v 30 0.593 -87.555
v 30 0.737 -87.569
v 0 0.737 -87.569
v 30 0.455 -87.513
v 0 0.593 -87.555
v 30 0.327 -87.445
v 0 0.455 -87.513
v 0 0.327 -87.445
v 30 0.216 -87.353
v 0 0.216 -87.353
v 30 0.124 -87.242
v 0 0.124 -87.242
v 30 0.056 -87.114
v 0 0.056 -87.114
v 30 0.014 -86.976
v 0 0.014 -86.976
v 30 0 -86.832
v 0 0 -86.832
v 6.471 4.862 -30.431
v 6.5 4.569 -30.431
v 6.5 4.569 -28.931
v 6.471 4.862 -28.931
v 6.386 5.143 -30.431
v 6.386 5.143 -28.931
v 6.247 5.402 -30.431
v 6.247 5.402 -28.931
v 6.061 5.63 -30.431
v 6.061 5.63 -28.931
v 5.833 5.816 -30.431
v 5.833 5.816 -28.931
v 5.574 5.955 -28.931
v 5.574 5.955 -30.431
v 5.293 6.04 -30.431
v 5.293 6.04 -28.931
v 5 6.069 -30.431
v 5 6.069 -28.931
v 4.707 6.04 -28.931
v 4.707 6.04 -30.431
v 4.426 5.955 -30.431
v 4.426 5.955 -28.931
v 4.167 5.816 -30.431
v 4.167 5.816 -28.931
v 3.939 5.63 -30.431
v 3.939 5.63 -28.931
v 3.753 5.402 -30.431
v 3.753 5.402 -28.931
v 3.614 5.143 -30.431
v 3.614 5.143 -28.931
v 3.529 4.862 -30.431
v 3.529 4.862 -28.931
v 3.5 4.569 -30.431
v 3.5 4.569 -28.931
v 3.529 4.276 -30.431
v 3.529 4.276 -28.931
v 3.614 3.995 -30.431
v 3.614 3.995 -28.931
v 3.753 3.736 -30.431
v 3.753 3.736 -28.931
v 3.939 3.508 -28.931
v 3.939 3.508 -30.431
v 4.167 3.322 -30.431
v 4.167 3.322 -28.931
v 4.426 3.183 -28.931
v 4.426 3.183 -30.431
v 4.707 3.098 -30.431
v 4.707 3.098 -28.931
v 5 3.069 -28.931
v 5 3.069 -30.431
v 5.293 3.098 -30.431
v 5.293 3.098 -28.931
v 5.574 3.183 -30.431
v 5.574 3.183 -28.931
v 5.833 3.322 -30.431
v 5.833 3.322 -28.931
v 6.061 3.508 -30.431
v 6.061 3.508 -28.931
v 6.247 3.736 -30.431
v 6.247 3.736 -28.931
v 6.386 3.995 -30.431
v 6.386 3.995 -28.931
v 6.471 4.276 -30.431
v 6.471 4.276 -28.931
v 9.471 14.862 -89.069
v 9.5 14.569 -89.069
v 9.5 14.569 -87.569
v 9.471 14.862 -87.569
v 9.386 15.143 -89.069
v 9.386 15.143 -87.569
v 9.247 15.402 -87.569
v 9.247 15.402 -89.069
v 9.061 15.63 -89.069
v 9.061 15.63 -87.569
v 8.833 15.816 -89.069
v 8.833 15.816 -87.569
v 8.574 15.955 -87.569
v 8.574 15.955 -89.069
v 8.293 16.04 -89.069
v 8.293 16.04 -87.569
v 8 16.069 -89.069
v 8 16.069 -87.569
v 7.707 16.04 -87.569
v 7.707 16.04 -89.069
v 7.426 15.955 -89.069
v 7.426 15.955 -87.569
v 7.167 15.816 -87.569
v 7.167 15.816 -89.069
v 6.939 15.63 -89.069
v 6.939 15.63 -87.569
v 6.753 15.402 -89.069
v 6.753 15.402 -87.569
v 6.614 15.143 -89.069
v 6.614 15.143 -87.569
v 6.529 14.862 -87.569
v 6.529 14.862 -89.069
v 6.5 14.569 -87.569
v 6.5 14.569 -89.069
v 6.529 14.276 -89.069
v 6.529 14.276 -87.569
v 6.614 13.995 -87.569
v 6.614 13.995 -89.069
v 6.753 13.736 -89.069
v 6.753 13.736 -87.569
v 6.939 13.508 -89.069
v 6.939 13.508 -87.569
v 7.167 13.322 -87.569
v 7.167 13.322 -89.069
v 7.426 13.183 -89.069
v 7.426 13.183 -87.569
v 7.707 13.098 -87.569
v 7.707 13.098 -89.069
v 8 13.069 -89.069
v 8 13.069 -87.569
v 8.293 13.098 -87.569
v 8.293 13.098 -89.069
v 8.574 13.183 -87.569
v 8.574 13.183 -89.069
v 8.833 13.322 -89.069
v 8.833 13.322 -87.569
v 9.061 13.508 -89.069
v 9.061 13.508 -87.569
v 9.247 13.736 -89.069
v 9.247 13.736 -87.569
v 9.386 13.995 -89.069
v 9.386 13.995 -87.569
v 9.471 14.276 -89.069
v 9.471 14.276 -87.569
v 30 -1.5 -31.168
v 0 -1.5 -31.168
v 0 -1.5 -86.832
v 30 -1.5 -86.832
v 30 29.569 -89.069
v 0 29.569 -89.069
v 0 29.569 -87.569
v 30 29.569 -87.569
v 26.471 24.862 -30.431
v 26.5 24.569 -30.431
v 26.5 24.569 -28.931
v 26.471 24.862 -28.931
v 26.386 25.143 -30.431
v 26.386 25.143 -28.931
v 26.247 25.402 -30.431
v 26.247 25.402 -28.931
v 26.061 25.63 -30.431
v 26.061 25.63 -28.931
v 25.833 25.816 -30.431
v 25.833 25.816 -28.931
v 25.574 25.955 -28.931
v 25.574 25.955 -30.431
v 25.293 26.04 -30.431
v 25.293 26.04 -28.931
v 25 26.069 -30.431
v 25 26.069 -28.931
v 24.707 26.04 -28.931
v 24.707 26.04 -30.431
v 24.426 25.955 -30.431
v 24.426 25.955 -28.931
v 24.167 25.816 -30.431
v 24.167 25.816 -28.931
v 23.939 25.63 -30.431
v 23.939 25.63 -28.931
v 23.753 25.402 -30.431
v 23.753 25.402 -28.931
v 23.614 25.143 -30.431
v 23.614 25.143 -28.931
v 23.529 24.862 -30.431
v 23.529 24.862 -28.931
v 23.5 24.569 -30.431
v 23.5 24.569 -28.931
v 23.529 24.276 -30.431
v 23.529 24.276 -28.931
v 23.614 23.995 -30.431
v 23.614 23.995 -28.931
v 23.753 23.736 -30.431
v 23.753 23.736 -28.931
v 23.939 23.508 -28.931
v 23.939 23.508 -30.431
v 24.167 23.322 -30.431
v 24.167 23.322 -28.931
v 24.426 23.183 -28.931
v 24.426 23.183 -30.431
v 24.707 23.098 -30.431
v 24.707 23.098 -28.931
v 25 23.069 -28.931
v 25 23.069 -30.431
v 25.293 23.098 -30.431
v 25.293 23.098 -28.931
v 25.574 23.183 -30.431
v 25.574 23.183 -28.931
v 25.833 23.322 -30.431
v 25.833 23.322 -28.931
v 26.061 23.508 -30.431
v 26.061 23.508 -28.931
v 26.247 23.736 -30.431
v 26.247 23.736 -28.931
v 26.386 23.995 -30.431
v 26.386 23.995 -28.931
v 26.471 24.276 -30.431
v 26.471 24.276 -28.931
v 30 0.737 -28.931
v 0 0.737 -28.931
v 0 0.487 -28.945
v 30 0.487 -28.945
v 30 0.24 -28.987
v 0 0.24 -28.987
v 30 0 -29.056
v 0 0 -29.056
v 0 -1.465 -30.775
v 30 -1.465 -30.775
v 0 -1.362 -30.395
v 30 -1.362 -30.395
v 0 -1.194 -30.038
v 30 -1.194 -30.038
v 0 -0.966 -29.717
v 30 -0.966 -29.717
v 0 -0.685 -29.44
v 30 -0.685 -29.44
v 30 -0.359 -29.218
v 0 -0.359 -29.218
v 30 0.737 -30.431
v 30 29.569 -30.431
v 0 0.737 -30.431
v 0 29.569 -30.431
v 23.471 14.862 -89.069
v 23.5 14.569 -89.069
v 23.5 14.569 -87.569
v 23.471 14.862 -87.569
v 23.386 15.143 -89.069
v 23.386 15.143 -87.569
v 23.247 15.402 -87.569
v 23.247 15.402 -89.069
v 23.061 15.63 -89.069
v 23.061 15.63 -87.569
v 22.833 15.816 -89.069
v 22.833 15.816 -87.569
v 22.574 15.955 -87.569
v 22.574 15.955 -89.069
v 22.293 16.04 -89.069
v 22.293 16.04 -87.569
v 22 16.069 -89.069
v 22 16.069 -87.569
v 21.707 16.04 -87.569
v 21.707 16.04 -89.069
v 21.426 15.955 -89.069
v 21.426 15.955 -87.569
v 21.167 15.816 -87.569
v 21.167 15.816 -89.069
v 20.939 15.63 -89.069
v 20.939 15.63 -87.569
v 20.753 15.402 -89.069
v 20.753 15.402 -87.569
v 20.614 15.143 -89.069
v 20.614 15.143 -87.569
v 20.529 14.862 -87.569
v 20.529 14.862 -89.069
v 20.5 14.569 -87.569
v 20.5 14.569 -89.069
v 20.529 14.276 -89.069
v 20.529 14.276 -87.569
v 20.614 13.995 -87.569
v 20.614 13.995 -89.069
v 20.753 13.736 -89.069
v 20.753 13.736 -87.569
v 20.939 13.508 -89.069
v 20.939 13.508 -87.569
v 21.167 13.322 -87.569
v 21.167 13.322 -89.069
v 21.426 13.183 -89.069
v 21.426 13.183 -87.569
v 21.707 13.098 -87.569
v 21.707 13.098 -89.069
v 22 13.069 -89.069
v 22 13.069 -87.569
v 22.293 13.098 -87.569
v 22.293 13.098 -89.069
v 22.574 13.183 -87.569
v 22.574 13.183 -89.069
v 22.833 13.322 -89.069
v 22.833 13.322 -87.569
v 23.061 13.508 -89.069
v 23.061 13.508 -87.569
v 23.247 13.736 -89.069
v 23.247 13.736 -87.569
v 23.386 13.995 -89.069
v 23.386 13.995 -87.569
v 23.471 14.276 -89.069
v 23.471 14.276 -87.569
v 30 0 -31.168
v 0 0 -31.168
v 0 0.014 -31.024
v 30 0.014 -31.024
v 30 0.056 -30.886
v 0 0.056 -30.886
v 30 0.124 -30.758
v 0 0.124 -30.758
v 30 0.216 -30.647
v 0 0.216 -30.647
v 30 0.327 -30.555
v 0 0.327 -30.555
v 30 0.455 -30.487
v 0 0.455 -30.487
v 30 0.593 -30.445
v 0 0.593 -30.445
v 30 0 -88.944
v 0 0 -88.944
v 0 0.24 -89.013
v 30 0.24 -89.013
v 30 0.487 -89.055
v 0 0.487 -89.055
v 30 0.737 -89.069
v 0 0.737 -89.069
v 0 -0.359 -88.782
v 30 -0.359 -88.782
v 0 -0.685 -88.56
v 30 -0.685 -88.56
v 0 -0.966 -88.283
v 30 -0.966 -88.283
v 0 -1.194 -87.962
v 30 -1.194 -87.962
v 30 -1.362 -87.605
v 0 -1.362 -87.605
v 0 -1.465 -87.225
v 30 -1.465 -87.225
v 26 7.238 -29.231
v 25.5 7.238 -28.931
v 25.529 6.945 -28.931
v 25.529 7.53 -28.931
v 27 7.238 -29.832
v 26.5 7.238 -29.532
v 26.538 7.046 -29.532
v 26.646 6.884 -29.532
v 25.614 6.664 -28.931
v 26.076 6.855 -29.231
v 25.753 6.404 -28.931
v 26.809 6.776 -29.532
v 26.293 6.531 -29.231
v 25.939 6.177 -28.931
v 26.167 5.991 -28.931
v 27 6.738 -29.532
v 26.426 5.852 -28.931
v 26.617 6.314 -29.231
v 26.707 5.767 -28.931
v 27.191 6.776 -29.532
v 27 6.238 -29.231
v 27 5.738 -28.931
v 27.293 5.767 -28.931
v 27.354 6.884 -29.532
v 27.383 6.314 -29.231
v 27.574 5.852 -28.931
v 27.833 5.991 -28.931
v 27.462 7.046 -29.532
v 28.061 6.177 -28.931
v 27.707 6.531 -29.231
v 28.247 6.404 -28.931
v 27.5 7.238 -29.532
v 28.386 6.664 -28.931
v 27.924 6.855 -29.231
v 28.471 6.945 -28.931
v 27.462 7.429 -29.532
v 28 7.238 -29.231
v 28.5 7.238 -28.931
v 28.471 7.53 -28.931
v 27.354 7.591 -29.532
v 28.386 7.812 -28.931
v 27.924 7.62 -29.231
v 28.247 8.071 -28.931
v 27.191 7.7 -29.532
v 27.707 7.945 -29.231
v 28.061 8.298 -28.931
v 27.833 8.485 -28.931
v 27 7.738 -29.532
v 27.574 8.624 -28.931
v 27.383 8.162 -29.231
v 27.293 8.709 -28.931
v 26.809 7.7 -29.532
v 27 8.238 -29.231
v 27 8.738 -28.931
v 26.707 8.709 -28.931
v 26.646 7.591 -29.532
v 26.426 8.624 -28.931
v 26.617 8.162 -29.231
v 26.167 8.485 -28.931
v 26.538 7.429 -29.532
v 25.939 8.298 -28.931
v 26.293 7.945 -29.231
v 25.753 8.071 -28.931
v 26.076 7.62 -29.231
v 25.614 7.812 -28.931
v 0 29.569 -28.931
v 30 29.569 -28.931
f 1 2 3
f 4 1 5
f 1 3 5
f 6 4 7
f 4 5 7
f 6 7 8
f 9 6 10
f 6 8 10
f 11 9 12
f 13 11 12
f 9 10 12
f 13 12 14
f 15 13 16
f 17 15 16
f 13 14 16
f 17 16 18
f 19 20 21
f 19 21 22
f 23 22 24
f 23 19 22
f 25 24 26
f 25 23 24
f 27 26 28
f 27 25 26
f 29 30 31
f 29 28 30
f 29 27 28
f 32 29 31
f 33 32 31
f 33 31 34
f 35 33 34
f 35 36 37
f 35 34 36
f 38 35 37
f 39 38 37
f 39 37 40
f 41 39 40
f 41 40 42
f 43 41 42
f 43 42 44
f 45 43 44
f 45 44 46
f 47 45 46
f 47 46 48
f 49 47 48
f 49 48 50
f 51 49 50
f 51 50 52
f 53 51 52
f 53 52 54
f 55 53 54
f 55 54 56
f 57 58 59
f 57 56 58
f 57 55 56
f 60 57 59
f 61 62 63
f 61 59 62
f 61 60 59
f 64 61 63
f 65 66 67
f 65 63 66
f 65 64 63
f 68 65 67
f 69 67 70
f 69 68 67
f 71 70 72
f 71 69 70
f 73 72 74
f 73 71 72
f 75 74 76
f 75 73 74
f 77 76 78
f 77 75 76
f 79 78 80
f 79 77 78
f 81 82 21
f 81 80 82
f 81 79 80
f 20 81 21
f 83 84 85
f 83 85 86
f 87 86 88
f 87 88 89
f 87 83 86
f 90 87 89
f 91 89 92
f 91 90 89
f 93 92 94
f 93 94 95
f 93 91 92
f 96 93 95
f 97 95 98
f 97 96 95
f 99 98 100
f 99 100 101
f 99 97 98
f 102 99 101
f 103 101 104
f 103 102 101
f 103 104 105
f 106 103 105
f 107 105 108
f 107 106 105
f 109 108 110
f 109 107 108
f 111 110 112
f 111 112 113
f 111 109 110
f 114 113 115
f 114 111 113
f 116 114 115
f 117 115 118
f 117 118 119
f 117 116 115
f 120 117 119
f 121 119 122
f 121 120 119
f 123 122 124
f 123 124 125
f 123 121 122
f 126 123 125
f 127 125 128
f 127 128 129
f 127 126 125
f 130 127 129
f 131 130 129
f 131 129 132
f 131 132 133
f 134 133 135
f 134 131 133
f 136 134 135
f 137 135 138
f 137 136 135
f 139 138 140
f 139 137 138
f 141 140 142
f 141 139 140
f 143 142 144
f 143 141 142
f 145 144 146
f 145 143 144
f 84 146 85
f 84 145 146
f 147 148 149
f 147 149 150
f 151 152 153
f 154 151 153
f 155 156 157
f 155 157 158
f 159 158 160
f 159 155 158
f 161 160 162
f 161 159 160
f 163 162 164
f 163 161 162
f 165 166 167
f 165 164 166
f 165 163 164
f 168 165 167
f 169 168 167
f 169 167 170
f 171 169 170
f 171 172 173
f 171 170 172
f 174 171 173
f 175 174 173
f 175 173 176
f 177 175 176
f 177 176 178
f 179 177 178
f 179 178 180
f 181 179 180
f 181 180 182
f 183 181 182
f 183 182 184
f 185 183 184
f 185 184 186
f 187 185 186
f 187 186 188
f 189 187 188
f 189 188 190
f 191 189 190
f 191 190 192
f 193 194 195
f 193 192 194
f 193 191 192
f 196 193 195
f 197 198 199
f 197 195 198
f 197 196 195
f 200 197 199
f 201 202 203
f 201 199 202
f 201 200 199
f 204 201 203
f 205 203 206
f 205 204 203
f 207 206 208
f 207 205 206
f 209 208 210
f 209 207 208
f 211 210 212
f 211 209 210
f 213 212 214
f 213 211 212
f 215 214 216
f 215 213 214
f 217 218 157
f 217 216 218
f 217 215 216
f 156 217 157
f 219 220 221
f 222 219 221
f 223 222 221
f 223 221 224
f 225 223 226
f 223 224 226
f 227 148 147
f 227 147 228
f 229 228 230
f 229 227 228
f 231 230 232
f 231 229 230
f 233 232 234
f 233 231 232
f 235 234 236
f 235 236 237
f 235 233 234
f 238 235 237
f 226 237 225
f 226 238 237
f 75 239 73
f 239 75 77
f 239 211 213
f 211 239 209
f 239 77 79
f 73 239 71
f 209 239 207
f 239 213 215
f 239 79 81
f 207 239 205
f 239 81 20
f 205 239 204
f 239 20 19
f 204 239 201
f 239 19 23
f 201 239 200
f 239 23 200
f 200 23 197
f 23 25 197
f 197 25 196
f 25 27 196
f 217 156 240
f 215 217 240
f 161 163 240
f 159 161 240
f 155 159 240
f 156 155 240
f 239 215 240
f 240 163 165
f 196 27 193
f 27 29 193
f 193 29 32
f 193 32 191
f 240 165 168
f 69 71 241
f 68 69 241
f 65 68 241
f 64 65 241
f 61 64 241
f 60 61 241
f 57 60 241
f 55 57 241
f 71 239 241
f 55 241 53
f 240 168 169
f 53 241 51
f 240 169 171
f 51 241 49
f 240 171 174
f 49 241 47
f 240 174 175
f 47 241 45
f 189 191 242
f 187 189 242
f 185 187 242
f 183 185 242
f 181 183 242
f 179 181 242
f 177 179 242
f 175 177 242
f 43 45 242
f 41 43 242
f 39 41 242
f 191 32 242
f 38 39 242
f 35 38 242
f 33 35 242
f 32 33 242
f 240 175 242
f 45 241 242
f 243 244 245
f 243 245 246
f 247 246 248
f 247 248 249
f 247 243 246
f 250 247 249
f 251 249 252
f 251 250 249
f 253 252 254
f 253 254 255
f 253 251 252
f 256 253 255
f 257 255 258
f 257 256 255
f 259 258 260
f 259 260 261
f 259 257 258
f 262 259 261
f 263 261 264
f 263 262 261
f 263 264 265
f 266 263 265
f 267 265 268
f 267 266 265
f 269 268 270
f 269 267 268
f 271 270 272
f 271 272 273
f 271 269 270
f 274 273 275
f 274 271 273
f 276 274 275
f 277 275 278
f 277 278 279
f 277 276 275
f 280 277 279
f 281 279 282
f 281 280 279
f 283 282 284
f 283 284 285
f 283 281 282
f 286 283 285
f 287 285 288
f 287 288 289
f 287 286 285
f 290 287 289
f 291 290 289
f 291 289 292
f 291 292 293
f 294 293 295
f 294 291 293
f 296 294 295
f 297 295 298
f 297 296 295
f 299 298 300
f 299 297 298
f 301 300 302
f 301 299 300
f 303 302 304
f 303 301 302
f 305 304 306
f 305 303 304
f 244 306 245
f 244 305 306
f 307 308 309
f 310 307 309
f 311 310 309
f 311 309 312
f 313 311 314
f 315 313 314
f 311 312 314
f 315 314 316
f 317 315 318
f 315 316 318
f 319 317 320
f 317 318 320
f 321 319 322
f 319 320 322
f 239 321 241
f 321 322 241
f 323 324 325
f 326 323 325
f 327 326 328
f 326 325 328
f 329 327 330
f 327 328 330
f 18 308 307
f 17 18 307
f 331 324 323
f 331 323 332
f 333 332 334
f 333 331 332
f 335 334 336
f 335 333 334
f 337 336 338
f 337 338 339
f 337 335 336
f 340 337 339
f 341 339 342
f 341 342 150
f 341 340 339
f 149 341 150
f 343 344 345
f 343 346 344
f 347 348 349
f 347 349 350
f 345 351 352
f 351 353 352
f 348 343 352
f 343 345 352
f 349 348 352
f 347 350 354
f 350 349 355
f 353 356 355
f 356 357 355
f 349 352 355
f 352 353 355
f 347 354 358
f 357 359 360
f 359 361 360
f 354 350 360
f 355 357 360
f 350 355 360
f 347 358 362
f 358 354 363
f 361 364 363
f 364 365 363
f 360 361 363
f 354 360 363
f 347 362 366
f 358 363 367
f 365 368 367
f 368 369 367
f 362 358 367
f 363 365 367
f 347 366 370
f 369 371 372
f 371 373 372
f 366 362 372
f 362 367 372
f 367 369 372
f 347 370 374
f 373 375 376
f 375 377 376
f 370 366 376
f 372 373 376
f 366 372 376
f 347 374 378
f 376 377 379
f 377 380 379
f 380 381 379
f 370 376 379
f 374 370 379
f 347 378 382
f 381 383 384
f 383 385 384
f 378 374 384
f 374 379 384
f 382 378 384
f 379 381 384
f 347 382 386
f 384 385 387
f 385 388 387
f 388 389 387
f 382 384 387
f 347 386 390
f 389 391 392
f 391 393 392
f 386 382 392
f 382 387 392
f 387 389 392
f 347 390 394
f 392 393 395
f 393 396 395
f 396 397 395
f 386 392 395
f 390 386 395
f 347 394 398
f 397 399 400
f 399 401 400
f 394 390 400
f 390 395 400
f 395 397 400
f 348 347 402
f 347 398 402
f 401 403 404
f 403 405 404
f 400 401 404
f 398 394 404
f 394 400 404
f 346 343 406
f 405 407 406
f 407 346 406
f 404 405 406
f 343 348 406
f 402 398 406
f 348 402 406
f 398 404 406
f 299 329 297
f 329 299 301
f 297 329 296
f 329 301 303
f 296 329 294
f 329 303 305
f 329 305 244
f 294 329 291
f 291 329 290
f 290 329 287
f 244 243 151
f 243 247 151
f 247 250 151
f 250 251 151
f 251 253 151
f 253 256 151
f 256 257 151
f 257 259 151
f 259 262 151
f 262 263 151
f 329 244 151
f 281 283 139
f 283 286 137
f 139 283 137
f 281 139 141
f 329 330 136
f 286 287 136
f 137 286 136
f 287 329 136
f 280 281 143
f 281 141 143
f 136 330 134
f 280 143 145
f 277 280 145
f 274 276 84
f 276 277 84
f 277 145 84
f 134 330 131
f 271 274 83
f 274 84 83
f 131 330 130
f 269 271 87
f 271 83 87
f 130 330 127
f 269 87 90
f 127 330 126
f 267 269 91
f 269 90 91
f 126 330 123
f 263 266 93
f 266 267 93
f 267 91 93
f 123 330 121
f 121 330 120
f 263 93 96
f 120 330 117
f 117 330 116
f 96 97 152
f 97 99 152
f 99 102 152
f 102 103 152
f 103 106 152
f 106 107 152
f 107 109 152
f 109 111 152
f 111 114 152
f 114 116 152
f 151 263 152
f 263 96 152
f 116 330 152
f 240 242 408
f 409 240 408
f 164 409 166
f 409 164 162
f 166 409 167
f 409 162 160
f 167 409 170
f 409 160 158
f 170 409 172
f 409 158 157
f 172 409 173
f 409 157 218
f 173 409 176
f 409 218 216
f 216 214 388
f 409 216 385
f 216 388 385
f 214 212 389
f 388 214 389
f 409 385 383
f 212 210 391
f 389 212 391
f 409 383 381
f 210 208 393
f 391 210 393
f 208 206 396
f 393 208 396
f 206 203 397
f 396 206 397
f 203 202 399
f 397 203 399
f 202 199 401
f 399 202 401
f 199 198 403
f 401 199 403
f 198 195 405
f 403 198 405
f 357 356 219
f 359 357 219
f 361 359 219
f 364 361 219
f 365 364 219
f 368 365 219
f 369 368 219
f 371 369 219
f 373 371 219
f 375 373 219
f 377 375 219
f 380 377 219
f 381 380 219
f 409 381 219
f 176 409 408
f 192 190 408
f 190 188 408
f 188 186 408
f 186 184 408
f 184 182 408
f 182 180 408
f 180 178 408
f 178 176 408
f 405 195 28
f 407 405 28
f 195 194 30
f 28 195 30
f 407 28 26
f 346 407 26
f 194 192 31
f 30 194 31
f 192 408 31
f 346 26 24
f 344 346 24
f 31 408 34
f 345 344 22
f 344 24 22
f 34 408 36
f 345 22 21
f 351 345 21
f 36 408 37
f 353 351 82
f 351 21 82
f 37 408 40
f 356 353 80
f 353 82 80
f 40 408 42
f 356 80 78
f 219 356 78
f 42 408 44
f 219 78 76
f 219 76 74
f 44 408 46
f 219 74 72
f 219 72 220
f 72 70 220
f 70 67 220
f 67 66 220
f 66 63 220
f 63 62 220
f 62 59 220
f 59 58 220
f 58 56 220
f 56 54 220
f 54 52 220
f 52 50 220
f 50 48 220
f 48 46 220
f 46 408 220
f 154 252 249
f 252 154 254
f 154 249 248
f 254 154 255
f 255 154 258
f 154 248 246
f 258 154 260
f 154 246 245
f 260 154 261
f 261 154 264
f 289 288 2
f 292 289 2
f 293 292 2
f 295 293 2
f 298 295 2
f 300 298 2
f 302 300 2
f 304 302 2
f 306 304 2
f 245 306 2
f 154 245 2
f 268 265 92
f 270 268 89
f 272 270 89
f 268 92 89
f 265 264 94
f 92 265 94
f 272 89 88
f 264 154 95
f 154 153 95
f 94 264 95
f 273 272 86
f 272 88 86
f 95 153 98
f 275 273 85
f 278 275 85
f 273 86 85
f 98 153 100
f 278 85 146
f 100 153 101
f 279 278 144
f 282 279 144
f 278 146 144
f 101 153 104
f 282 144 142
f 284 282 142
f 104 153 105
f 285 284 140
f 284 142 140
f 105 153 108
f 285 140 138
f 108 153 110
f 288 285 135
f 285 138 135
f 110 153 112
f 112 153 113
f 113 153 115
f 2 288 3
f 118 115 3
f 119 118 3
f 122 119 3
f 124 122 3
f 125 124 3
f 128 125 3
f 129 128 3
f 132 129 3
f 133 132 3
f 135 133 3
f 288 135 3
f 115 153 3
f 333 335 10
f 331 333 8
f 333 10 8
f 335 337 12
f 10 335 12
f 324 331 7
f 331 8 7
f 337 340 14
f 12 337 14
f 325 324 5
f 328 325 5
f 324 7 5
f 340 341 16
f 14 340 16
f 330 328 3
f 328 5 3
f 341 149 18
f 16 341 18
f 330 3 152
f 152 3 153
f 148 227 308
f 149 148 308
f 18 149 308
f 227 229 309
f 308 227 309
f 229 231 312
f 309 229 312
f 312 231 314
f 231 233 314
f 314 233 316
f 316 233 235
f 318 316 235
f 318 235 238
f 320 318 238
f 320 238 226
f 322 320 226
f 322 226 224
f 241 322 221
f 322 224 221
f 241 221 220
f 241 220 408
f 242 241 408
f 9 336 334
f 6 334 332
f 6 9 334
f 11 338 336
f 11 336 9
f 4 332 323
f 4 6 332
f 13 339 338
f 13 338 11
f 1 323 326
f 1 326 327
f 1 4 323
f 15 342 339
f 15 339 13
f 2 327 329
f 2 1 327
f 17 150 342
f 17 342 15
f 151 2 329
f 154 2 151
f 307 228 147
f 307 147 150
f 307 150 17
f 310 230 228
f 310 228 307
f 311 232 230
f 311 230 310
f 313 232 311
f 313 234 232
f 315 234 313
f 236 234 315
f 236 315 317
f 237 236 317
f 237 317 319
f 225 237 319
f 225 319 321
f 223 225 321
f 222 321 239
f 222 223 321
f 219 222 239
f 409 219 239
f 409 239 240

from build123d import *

# Parameters (mm, degrees)
SKETCH1_W                       = 30
SKETCH1_H                       = 118
SKETCH1_R                       = 1.5
BASE_FLANGE1_DEPTH              = 1.5
SKETCHED_BEND1_DEPTH            = 30
SKETCHED_BEND1_2_DEPTH          = 30
SKETCHED_START                  = -89.06902709
SKETCHED_BEND1_3_OUTLINE_R      = 1.5
SKETCHED_BEND1_3_DEPTH          = 1.5
SKETCHED_START_2                = -87.56902709
SKETCHED_BEND1_4_OUTLINE_R      = 1.5
SKETCHED_BEND1_4_DEPTH          = 59.56902709
F_3_0MM_PRESS_DOWEL_HOLE1_D     = 3
F_3_0MM_PRESS_DOWEL_HOLE1_DEPTH = 6
F_3_0MM_PRESS_DOWEL_HOLE1_TIP   = 0.901290929


with BuildPart() as part:
    # Base-Flange1: sheet metal written as solids
    # Sketch1 → Base-Flange1 (new body)
    with BuildSketch(Plane(origin=(0, 0, 0), x_dir=(1, 0, 0), z_dir=(0, 1, 0))):
        with Locations((15, 59)):
            Rectangle(SKETCH1_W, SKETCH1_H)
        with Locations(Location((8, 103, 0), (0, 0, 270))):
            Circle(SKETCH1_R, mode=Mode.SUBTRACT)
        with Locations(Location((22, 103, 0), (0, 0, 270))):
            Circle(SKETCH1_R, mode=Mode.SUBTRACT)
        with Locations(Location((25, 5, 0), (0, 0, 270))):
            Circle(SKETCH1_R, mode=Mode.SUBTRACT)
        with Locations(Location((5, 25, 0), (0, 0, 270))):
            Circle(SKETCH1_R, mode=Mode.SUBTRACT)
    extrude(amount=-BASE_FLANGE1_DEPTH)

    # Sketched Bend1: read off the stored shape, not the designer's step
    # Sketched Bend1 outline → Sketched Bend1 (cut)
    with BuildSketch(Plane.YZ):
        with BuildLine():
            ThreePointArc((0, -88.944250946), (-1.086838938, -88.127591172), (-1.5, -86.83242709))
            Line((-1.5, -86.83242709), (-1.5, -118))
            Line((-1.5, -118), (0, -118))
            Line((0, -118), (0, -88.944250946))
        make_face()
        with BuildLine():
            Line((-1.5, 0), (-1.5, -31.16757291))
            ThreePointArc((-1.5, -31.16757291), (-1.086838938, -29.872408828), (0, -29.055749054))
            Line((0, -29.055749054), (0, 0))
            Line((0, 0), (-1.5, 0))
        make_face()
    extrude(amount=SKETCHED_BEND1_DEPTH, mode=Mode.SUBTRACT)

    # Sketched Bend1 2 outline → Sketched Bend1 2 (add)
    with BuildSketch(Plane.YZ):
        with BuildLine():
            Line((0, -86.83242709), (0, -88.944250946))
            ThreePointArc((0, -88.944250946), (0.363053267, -89.037612433), (0.7366, -89.06902709))
            Line((0.7366, -89.06902709), (29.56902709, -89.06902709))
            Line((29.56902709, -89.06902709), (29.56902709, -87.56902709))
            Line((29.56902709, -87.56902709), (0.7366, -87.56902709))
            ThreePointArc((0.7366, -87.56902709), (0.215745145, -87.353281945), (0, -86.83242709))
        make_face()
        with BuildLine():
            ThreePointArc((0.7366, -28.93097291), (0.363053267, -28.962387567), (0, -29.055749054))
            Line((0, -29.055749054), (0, -31.16757291))
            ThreePointArc((0, -31.16757291), (0.215745145, -30.646718055), (0.7366, -30.43097291))
            Line((0.7366, -30.43097291), (29.56902709, -30.43097291))
            Line((29.56902709, -30.43097291), (29.56902709, -28.93097291))
            Line((29.56902709, -28.93097291), (0.7366, -28.93097291))
        make_face()
    extrude(amount=SKETCHED_BEND1_2_DEPTH)

    # Sketched Bend1 3 outline → Sketched Bend1 3 (cut)
    with BuildSketch(Plane.XY.offset(SKETCHED_START)):
        with Locations((8, 14.56902709)):
            Circle(SKETCHED_BEND1_3_OUTLINE_R)
        with Locations((22, 14.56902709)):
            Circle(SKETCHED_BEND1_3_OUTLINE_R)
    extrude(amount=SKETCHED_BEND1_3_DEPTH, mode=Mode.SUBTRACT)

    # Sketched Bend1 4 outline → Sketched Bend1 4 (cut)
    with BuildSketch(Plane.XY.offset(SKETCHED_START_2)):
        with Locations((5, 4.56902709)):
            Circle(SKETCHED_BEND1_4_OUTLINE_R)
        with Locations((25, 24.56902709)):
            Circle(SKETCHED_BEND1_4_OUTLINE_R)
    extrude(amount=SKETCHED_BEND1_4_DEPTH, mode=Mode.SUBTRACT)

    # Ø3.0mm Press Dowel Hole1
    with Locations(Plane(origin=(257.525513363, 325.031359221, -22.93097291), x_dir=(-1, 0, 0), z_dir=(0, 0, 1))):
        with Locations((220.525513363, 156.531359221), (102.525513363, 181.531359221), (102.525513363, 271.531359221), (89.19270005, 226.531359221), (210.525513363, 317.793651488), (230.525513363, 317.793651488), (252.525513363, 320.462332131), (232.525513363, 300.462332131), (252.525513363, 132.600386311), (232.525513363, 152.600386311), (111.286271896, 136.531359221), (91.286271896, 136.531359221), (41.525513363, 196.432813402), (13.525513363, 196.432813402), (41.525513363, 138.767959221), (13.525513363, 138.767959221), (41.525513363, 256.62990504), (13.525513363, 256.62990504), (41.525513363, 314.294759221), (13.525513363, 314.294759221)):
            Hole(F_3_0MM_PRESS_DOWEL_HOLE1_D / 2, depth=F_3_0MM_PRESS_DOWEL_HOLE1_DEPTH)
            with Locations((0, 0, -(F_3_0MM_PRESS_DOWEL_HOLE1_DEPTH + F_3_0MM_PRESS_DOWEL_HOLE1_TIP / 2))):  # 118° drill point
                Cone(0, F_3_0MM_PRESS_DOWEL_HOLE1_D / 2, F_3_0MM_PRESS_DOWEL_HOLE1_TIP, mode=Mode.SUBTRACT)


solid = part.part
